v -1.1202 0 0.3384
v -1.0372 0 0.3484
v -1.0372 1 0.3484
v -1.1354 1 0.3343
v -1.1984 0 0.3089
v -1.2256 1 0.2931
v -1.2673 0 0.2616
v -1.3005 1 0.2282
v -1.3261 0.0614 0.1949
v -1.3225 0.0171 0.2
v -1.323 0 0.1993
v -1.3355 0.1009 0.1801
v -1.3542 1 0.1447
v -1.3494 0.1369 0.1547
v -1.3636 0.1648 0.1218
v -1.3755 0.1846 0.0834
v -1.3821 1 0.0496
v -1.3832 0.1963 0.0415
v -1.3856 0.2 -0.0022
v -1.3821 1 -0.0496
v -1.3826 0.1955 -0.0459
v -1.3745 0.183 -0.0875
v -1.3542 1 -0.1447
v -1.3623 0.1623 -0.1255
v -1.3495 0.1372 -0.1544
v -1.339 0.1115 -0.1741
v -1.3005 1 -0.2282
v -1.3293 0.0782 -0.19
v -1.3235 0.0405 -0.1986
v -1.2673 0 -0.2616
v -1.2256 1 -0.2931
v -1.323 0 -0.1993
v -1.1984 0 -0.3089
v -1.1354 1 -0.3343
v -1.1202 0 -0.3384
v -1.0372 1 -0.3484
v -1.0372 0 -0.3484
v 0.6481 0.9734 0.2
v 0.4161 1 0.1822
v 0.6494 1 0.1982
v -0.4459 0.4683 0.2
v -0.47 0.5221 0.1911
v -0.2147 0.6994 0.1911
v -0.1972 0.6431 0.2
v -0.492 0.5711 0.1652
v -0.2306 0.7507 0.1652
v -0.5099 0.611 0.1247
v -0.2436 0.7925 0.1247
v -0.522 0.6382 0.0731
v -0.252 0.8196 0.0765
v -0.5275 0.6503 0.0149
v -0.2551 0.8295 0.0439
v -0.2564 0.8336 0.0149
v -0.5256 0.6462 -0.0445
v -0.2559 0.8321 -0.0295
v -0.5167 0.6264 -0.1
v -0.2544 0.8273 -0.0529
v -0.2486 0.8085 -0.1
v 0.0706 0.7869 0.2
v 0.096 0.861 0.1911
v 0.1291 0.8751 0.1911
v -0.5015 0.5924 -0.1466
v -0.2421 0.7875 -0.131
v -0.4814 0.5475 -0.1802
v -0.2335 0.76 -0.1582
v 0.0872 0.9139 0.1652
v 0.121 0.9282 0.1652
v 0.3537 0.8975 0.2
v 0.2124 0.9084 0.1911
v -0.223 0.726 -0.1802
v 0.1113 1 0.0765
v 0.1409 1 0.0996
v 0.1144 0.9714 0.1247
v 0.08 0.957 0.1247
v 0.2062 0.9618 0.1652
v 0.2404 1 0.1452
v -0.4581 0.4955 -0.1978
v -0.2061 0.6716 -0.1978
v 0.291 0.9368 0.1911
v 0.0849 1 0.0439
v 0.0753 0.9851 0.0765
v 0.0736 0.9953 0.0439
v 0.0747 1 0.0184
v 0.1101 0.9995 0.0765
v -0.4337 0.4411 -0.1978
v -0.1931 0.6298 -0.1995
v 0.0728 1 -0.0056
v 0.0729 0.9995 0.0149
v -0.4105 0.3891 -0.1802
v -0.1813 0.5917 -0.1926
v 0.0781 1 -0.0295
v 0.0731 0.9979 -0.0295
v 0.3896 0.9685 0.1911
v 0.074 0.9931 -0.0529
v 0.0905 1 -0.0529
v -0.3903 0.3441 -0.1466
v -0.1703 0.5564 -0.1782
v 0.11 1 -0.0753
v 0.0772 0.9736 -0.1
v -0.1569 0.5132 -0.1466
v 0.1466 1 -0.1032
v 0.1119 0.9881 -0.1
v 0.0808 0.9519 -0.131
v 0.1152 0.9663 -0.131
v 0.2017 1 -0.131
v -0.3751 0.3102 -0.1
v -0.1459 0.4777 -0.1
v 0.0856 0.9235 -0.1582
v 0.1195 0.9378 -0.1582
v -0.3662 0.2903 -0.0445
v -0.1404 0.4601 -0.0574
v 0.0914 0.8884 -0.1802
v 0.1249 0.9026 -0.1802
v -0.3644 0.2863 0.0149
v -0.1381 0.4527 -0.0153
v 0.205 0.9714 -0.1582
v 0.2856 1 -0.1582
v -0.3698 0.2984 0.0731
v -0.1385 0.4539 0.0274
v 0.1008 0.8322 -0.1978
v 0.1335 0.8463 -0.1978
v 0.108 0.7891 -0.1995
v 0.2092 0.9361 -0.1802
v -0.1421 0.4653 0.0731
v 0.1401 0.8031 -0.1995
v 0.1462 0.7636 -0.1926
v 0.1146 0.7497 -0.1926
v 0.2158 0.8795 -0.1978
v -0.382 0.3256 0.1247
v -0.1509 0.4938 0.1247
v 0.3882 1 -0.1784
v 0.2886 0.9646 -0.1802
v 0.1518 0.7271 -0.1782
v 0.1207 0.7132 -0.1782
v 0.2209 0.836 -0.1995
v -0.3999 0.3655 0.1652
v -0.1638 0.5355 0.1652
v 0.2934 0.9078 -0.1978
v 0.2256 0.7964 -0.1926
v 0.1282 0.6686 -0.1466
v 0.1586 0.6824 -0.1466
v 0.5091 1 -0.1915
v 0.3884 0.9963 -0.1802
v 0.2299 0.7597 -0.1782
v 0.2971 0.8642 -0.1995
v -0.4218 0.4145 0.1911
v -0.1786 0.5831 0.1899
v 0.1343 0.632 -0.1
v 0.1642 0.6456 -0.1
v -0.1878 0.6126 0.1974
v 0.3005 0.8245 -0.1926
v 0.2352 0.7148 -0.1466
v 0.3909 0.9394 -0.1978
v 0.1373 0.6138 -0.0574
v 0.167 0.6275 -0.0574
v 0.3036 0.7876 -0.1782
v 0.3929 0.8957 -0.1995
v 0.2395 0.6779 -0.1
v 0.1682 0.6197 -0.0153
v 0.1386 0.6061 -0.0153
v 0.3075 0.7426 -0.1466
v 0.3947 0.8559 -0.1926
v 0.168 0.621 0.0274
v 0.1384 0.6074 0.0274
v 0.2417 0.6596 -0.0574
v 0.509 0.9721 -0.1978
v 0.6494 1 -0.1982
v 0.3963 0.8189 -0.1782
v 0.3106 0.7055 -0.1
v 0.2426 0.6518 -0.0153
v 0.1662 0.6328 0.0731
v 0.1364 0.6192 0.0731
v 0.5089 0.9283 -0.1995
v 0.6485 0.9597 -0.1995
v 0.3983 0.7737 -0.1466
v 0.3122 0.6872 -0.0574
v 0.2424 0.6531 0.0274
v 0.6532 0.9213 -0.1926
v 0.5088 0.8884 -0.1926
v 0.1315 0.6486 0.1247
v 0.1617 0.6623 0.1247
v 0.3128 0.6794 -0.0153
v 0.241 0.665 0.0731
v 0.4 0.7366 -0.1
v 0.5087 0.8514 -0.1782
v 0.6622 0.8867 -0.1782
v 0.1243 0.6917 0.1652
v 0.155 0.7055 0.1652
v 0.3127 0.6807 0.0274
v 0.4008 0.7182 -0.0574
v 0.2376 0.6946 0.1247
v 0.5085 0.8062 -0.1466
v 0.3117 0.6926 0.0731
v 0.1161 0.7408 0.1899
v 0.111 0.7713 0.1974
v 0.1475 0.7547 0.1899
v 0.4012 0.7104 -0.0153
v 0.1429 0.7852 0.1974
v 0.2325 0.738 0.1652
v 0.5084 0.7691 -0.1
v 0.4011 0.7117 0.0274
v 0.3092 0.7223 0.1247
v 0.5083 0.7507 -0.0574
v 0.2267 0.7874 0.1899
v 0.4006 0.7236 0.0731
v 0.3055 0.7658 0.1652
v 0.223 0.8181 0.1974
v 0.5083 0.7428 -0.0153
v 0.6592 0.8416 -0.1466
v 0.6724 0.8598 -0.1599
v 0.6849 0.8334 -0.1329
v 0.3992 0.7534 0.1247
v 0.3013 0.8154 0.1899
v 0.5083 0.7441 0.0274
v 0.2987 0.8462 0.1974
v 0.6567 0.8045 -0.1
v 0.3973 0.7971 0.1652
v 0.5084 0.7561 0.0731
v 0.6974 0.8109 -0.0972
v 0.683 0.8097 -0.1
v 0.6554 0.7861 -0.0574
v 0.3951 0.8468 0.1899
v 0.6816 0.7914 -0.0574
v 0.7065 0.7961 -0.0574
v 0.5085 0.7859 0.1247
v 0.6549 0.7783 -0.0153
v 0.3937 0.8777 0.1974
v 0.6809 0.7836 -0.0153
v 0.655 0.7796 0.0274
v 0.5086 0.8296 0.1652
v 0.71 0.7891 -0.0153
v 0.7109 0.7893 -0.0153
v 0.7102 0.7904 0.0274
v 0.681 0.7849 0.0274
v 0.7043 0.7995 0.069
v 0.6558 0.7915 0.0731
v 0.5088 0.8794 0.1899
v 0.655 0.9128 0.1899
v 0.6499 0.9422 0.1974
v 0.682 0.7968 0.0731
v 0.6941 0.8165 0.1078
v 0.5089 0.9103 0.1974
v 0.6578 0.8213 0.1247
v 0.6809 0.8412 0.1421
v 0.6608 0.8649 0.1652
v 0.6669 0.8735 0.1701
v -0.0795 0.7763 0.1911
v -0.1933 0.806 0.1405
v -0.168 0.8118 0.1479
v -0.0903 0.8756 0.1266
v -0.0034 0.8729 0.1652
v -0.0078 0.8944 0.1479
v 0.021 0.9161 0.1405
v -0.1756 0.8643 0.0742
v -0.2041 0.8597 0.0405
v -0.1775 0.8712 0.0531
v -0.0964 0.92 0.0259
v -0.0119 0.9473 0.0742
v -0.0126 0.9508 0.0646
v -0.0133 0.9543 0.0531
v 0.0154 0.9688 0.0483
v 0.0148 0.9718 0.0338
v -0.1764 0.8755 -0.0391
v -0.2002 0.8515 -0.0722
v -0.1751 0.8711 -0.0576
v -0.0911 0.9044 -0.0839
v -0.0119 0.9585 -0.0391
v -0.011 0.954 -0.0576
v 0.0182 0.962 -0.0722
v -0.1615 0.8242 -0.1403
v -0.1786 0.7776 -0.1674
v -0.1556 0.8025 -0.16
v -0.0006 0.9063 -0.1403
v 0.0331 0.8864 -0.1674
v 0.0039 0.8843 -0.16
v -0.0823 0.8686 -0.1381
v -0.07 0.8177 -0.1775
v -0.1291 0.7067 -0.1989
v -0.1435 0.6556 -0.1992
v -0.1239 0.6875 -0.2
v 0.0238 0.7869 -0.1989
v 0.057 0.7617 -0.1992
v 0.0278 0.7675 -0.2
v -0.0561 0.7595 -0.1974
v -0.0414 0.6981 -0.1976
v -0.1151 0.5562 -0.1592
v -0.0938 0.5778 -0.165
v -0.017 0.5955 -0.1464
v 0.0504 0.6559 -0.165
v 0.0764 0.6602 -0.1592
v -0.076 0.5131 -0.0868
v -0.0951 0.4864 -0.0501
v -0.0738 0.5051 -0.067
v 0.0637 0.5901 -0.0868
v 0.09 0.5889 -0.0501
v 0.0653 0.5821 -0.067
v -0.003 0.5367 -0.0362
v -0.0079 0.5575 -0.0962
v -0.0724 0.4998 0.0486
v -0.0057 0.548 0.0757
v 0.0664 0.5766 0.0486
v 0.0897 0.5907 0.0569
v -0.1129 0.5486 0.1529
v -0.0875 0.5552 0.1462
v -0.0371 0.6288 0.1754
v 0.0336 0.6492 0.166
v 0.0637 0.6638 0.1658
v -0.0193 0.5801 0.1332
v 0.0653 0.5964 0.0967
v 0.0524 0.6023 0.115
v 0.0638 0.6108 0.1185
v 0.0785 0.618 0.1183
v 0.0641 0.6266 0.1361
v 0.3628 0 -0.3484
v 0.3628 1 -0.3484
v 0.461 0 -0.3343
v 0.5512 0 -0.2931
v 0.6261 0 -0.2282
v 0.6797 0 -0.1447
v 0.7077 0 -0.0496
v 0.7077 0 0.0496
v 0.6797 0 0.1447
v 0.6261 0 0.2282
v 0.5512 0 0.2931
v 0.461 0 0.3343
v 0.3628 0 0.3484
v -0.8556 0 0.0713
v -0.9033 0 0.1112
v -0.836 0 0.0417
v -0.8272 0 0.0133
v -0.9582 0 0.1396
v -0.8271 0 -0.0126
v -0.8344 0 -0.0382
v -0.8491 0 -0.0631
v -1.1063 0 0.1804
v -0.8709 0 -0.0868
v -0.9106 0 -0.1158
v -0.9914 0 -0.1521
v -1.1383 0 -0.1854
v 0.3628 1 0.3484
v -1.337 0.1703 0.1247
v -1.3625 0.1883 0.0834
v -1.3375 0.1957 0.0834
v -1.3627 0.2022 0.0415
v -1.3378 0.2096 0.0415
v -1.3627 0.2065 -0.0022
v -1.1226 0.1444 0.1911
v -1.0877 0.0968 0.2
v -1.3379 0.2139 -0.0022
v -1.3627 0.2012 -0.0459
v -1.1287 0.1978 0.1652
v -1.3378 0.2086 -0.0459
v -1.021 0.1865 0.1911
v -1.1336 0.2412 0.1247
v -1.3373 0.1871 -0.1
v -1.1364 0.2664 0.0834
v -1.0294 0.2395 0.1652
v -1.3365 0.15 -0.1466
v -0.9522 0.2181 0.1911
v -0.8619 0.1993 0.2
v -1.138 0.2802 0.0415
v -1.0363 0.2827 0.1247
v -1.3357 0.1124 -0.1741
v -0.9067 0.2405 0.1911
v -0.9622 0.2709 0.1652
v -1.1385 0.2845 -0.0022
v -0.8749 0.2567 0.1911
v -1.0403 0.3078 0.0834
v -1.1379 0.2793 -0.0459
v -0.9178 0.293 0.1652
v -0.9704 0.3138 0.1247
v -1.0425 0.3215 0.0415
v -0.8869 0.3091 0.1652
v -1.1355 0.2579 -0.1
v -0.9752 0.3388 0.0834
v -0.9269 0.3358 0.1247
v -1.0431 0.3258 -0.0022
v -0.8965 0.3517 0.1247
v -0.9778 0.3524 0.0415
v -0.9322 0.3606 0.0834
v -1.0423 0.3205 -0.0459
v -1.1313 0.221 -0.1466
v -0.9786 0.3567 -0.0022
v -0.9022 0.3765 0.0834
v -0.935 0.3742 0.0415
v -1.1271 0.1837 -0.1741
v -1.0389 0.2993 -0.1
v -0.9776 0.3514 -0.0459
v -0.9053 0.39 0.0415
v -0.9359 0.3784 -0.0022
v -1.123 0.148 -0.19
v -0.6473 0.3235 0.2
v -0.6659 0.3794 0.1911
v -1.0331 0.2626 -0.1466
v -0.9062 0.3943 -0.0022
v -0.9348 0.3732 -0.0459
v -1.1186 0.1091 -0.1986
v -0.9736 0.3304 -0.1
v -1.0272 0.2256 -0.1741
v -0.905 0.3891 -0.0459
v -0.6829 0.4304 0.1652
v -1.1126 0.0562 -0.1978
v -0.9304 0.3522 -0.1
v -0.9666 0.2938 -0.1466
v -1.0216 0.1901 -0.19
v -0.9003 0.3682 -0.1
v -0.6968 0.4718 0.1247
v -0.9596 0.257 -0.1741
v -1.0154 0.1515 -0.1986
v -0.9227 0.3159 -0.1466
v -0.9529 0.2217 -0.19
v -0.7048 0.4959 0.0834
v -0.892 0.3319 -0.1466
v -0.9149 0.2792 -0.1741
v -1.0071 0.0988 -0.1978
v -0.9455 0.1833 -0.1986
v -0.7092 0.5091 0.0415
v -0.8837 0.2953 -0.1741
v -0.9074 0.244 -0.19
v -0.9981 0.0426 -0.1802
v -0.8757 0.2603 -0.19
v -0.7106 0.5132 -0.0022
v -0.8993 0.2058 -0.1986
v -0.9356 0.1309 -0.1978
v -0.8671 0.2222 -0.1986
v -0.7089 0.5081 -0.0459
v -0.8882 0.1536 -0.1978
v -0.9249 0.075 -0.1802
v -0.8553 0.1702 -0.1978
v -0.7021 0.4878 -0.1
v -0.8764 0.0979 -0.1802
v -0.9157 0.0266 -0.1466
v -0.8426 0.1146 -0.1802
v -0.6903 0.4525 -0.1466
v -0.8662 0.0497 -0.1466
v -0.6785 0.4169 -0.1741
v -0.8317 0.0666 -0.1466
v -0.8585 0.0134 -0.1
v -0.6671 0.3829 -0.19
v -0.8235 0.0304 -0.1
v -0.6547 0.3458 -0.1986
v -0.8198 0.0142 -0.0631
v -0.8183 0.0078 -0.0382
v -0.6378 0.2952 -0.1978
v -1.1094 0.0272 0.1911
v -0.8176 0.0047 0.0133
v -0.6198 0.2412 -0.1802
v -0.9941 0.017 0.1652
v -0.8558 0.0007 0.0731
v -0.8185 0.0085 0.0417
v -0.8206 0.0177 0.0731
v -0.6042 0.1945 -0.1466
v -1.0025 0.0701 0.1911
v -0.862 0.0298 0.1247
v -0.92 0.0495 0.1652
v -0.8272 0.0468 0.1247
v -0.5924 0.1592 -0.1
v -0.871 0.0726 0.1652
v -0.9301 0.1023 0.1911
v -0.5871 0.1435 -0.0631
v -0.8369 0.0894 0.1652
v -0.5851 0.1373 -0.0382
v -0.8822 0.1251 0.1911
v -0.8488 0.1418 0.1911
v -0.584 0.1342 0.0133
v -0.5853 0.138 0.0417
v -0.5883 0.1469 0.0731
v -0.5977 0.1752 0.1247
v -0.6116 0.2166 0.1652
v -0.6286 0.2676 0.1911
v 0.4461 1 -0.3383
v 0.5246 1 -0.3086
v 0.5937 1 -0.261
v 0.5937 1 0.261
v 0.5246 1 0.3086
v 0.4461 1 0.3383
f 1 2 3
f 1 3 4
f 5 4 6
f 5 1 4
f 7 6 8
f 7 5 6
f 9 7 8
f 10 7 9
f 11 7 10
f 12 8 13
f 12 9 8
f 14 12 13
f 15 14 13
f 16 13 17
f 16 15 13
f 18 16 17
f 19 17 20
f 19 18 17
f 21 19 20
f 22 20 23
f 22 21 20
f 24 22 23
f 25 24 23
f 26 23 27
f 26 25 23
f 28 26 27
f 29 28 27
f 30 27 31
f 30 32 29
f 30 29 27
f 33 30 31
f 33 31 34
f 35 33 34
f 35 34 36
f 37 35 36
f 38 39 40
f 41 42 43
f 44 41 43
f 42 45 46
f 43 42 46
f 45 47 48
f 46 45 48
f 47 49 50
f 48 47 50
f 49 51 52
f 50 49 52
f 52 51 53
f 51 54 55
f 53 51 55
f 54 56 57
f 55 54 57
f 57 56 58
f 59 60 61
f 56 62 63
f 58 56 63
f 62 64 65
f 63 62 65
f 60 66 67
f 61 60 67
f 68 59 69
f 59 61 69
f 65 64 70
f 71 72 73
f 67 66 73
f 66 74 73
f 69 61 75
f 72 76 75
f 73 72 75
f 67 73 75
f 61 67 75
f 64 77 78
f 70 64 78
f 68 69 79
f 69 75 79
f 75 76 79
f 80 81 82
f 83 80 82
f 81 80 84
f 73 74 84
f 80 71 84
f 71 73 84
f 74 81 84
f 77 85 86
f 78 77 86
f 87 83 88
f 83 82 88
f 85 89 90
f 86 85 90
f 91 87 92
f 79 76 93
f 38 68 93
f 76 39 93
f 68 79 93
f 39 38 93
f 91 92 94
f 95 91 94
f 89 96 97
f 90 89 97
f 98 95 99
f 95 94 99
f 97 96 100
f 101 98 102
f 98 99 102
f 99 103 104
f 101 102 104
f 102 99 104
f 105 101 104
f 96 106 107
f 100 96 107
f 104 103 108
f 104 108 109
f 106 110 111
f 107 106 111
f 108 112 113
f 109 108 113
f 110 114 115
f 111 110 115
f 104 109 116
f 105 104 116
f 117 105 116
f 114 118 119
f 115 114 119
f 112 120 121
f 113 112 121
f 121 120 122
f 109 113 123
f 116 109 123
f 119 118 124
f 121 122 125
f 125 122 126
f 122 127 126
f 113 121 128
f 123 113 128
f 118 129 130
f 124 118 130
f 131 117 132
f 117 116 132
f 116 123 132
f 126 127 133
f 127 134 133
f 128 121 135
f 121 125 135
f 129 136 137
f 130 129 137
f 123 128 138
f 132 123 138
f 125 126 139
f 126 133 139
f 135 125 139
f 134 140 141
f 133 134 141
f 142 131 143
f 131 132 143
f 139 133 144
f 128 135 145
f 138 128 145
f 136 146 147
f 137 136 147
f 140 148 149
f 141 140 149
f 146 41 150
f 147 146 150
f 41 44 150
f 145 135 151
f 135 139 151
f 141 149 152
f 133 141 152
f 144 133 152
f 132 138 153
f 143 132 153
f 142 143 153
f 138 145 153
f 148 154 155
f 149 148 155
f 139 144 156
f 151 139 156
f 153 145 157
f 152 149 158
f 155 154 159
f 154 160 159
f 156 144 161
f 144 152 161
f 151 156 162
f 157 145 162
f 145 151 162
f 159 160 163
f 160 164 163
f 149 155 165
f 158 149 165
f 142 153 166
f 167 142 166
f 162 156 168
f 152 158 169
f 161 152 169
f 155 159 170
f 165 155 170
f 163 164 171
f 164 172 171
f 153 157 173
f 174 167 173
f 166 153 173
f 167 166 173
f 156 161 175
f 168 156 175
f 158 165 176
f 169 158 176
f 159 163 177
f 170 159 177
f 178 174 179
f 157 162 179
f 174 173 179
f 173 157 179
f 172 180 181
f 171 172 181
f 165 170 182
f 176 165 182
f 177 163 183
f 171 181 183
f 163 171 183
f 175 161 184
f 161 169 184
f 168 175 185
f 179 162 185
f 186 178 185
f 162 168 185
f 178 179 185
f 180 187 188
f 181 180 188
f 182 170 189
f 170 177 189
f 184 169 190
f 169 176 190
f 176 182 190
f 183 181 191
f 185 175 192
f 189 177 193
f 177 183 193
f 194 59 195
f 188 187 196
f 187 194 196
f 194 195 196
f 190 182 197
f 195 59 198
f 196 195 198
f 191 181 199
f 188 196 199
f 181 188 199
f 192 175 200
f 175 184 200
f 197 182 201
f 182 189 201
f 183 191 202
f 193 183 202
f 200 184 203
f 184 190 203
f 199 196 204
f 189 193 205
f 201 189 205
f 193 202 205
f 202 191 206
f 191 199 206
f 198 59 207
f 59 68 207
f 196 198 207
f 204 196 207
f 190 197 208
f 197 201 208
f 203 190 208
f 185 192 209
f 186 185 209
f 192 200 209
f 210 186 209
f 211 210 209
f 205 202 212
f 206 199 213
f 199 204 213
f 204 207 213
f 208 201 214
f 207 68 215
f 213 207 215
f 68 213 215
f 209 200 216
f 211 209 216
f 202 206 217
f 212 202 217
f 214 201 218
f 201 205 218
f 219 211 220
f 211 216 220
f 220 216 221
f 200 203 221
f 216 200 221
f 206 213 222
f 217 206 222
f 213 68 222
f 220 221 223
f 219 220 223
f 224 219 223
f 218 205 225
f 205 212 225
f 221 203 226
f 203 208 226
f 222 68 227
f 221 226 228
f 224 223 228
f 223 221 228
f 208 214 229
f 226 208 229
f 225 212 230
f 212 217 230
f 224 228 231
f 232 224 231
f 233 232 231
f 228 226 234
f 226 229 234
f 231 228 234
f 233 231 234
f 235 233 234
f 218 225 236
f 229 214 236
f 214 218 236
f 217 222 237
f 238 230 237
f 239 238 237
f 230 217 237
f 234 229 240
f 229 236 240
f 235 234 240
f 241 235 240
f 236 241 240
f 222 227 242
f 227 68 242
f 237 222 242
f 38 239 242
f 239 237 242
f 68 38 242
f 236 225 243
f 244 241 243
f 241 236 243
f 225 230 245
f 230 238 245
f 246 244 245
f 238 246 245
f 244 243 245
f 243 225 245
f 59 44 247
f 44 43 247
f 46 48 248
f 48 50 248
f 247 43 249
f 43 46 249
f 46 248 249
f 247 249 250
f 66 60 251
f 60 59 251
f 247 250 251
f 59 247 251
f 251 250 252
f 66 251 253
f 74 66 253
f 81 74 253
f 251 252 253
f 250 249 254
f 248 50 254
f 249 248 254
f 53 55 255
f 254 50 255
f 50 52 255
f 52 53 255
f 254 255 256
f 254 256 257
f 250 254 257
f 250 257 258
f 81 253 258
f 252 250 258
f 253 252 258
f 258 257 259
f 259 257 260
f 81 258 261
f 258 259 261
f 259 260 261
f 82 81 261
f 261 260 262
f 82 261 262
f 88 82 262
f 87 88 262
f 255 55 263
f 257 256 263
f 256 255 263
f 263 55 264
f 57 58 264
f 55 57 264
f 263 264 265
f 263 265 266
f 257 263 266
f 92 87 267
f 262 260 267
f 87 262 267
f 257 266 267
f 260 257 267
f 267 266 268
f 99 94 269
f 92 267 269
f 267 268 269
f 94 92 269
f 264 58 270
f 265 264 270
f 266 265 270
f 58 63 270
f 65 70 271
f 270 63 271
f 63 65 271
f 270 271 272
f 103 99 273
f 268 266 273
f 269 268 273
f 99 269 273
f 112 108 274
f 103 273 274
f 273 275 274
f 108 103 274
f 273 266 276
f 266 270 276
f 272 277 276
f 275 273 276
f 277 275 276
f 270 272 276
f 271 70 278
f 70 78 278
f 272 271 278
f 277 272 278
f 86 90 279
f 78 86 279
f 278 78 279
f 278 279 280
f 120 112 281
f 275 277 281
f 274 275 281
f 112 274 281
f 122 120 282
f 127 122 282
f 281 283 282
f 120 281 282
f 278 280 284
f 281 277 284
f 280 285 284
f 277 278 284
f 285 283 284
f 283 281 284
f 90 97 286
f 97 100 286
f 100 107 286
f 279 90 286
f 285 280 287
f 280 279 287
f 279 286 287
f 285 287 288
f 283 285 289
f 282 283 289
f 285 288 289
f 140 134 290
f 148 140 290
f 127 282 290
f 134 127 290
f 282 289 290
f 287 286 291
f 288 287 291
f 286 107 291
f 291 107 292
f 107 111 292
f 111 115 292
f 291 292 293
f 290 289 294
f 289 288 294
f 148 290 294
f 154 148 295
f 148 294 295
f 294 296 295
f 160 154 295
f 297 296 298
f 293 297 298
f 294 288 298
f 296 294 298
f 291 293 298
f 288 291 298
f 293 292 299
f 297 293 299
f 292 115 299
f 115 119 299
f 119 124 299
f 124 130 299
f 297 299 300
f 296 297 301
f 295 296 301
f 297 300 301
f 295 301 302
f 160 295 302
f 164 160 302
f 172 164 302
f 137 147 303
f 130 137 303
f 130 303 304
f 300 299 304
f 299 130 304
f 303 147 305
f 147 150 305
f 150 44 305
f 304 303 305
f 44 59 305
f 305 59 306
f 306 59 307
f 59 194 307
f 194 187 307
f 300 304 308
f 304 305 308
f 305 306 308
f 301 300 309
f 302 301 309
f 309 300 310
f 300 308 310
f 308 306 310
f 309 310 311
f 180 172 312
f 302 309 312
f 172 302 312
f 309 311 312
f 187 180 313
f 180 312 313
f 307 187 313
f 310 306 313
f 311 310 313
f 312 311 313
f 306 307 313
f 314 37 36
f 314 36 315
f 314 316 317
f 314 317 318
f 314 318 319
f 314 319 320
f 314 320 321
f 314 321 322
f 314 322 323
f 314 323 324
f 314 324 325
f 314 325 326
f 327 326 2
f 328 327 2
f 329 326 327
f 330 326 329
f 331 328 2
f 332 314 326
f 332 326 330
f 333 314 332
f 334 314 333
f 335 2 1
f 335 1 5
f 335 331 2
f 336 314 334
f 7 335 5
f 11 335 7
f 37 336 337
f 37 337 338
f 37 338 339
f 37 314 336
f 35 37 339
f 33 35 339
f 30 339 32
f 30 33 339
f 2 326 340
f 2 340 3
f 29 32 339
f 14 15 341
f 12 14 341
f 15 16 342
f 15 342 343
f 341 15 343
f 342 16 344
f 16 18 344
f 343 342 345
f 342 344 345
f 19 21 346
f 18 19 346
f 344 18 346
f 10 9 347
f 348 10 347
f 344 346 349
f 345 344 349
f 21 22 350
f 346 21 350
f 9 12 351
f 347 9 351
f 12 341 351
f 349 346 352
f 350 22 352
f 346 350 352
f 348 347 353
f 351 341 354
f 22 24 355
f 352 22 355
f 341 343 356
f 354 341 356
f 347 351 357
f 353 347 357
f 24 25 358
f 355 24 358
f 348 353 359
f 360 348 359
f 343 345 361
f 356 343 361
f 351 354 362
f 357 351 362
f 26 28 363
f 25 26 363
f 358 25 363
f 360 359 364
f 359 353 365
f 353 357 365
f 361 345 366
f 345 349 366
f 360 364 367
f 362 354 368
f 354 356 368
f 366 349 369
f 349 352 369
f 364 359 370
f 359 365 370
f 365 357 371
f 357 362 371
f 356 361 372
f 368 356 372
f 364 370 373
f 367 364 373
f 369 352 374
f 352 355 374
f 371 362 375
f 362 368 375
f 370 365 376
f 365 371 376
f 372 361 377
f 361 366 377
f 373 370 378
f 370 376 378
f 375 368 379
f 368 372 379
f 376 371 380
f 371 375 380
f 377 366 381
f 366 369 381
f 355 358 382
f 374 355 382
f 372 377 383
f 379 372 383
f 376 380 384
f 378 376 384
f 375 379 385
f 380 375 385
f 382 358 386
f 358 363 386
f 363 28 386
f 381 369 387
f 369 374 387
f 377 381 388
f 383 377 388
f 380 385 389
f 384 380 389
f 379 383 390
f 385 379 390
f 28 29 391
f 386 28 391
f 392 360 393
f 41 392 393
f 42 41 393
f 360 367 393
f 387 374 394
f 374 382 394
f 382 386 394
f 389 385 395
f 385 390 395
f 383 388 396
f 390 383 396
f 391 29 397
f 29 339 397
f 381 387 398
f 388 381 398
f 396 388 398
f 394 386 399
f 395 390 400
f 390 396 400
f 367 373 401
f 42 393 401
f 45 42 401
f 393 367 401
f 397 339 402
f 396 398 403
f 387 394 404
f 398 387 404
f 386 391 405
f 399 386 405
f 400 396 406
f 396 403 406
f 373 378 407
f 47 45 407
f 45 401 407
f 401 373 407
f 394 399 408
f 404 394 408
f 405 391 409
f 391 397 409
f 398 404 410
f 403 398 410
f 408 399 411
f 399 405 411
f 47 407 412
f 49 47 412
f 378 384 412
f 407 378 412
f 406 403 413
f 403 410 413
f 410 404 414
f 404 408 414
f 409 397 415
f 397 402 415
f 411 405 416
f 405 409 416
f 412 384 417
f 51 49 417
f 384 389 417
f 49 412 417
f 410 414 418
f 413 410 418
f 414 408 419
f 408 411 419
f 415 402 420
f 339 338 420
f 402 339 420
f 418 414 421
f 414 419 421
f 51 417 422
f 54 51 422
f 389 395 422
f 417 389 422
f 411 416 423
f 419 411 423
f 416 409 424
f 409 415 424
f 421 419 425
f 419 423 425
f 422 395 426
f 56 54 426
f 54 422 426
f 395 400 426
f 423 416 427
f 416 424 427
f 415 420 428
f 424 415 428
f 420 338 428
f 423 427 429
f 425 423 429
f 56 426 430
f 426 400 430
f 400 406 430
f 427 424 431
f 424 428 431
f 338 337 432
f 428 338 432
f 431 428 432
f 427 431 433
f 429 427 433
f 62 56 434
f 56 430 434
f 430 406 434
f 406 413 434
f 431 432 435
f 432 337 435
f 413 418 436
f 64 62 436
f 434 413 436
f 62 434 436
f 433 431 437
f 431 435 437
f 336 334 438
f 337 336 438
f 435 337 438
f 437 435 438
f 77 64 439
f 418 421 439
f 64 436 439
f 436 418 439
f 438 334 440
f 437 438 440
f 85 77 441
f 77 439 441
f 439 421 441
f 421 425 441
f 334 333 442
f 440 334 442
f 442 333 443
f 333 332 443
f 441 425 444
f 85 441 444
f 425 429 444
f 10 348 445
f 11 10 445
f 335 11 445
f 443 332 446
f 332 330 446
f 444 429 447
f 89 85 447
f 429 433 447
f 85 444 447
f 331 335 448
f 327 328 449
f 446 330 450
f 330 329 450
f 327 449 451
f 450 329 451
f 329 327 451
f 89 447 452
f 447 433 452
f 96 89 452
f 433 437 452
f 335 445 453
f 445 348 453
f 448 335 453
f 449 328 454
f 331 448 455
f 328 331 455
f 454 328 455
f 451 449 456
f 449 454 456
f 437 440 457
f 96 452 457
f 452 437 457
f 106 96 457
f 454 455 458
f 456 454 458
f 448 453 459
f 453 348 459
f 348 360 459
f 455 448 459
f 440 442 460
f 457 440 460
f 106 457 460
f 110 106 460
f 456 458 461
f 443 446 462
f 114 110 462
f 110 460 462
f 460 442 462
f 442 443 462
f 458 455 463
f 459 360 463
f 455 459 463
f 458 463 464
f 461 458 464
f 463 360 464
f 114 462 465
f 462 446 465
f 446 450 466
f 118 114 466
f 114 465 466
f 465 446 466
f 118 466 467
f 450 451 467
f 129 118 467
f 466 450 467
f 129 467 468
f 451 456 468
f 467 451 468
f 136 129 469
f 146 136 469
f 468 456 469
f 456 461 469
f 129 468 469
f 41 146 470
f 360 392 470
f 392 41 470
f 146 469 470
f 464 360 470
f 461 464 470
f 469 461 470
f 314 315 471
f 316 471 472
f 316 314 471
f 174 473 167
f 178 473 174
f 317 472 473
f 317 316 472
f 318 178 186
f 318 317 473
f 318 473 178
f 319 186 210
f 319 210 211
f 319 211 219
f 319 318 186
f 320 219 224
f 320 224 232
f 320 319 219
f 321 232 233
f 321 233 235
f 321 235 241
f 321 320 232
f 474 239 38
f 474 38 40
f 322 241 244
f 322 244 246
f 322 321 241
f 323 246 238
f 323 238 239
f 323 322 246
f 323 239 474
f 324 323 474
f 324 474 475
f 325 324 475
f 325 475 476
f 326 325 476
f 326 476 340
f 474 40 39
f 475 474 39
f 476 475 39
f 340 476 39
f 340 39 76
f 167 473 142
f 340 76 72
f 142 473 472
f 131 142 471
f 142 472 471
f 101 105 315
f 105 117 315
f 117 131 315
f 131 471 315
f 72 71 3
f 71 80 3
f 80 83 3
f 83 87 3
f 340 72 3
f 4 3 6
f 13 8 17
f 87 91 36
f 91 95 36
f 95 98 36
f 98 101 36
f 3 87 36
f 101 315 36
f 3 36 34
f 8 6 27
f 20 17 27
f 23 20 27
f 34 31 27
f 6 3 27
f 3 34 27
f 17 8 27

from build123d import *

# Parameters (mm, degrees)
BOSS_EXTRUDE1_DEPTH = 1
SKETCH4_R           = 0.2


with BuildPart() as part:
    # Sketch1 → Boss-Extrude1 (new body)
    with BuildSketch(Plane(origin=(0, 0, 0), x_dir=(1, 0, 0), z_dir=(0, 1, 0))):
        with BuildLine():
            Line((-1.037204748, 0.3484375), (0.362795252, 0.3484375))
            ThreePointArc((0.362795252, 0.3484375), (0.711232752, 0), (0.362795252, -0.3484375))
            Line((0.362795252, -0.3484375), (-1.037204748, -0.3484375))
            ThreePointArc((-1.037204748, -0.3484375), (-1.385642248, 0), (-1.037204748, 0.3484375))
        make_face()
    extrude(amount=BOSS_EXTRUDE1_DEPTH)

    # Cut-Sweep3: sweep along a path in Sketch2
    with BuildLine(Plane.XY) as cut_sweep3_path:
        ThreePointArc((-1.385642248, 0), (-0.891042659, 0.184490952), (-0.445928668, 0.468285243))
        ThreePointArc((-0.445928668, 0.468285243), (0.147274351, 0.820781614), (0.813625821, 1))
    # Sketch4 → Cut-Sweep3 (sweep, cut)
    with BuildSketch(Plane(origin=(-1.385642248, 1, 0), x_dir=(0, 0, 1), z_dir=(-1, 0, 0))):
        with Locations((0, -1)):
            Circle(SKETCH4_R)
    sweep(path=cut_sweep3_path.line, mode=Mode.SUBTRACT)


solid = part.part
